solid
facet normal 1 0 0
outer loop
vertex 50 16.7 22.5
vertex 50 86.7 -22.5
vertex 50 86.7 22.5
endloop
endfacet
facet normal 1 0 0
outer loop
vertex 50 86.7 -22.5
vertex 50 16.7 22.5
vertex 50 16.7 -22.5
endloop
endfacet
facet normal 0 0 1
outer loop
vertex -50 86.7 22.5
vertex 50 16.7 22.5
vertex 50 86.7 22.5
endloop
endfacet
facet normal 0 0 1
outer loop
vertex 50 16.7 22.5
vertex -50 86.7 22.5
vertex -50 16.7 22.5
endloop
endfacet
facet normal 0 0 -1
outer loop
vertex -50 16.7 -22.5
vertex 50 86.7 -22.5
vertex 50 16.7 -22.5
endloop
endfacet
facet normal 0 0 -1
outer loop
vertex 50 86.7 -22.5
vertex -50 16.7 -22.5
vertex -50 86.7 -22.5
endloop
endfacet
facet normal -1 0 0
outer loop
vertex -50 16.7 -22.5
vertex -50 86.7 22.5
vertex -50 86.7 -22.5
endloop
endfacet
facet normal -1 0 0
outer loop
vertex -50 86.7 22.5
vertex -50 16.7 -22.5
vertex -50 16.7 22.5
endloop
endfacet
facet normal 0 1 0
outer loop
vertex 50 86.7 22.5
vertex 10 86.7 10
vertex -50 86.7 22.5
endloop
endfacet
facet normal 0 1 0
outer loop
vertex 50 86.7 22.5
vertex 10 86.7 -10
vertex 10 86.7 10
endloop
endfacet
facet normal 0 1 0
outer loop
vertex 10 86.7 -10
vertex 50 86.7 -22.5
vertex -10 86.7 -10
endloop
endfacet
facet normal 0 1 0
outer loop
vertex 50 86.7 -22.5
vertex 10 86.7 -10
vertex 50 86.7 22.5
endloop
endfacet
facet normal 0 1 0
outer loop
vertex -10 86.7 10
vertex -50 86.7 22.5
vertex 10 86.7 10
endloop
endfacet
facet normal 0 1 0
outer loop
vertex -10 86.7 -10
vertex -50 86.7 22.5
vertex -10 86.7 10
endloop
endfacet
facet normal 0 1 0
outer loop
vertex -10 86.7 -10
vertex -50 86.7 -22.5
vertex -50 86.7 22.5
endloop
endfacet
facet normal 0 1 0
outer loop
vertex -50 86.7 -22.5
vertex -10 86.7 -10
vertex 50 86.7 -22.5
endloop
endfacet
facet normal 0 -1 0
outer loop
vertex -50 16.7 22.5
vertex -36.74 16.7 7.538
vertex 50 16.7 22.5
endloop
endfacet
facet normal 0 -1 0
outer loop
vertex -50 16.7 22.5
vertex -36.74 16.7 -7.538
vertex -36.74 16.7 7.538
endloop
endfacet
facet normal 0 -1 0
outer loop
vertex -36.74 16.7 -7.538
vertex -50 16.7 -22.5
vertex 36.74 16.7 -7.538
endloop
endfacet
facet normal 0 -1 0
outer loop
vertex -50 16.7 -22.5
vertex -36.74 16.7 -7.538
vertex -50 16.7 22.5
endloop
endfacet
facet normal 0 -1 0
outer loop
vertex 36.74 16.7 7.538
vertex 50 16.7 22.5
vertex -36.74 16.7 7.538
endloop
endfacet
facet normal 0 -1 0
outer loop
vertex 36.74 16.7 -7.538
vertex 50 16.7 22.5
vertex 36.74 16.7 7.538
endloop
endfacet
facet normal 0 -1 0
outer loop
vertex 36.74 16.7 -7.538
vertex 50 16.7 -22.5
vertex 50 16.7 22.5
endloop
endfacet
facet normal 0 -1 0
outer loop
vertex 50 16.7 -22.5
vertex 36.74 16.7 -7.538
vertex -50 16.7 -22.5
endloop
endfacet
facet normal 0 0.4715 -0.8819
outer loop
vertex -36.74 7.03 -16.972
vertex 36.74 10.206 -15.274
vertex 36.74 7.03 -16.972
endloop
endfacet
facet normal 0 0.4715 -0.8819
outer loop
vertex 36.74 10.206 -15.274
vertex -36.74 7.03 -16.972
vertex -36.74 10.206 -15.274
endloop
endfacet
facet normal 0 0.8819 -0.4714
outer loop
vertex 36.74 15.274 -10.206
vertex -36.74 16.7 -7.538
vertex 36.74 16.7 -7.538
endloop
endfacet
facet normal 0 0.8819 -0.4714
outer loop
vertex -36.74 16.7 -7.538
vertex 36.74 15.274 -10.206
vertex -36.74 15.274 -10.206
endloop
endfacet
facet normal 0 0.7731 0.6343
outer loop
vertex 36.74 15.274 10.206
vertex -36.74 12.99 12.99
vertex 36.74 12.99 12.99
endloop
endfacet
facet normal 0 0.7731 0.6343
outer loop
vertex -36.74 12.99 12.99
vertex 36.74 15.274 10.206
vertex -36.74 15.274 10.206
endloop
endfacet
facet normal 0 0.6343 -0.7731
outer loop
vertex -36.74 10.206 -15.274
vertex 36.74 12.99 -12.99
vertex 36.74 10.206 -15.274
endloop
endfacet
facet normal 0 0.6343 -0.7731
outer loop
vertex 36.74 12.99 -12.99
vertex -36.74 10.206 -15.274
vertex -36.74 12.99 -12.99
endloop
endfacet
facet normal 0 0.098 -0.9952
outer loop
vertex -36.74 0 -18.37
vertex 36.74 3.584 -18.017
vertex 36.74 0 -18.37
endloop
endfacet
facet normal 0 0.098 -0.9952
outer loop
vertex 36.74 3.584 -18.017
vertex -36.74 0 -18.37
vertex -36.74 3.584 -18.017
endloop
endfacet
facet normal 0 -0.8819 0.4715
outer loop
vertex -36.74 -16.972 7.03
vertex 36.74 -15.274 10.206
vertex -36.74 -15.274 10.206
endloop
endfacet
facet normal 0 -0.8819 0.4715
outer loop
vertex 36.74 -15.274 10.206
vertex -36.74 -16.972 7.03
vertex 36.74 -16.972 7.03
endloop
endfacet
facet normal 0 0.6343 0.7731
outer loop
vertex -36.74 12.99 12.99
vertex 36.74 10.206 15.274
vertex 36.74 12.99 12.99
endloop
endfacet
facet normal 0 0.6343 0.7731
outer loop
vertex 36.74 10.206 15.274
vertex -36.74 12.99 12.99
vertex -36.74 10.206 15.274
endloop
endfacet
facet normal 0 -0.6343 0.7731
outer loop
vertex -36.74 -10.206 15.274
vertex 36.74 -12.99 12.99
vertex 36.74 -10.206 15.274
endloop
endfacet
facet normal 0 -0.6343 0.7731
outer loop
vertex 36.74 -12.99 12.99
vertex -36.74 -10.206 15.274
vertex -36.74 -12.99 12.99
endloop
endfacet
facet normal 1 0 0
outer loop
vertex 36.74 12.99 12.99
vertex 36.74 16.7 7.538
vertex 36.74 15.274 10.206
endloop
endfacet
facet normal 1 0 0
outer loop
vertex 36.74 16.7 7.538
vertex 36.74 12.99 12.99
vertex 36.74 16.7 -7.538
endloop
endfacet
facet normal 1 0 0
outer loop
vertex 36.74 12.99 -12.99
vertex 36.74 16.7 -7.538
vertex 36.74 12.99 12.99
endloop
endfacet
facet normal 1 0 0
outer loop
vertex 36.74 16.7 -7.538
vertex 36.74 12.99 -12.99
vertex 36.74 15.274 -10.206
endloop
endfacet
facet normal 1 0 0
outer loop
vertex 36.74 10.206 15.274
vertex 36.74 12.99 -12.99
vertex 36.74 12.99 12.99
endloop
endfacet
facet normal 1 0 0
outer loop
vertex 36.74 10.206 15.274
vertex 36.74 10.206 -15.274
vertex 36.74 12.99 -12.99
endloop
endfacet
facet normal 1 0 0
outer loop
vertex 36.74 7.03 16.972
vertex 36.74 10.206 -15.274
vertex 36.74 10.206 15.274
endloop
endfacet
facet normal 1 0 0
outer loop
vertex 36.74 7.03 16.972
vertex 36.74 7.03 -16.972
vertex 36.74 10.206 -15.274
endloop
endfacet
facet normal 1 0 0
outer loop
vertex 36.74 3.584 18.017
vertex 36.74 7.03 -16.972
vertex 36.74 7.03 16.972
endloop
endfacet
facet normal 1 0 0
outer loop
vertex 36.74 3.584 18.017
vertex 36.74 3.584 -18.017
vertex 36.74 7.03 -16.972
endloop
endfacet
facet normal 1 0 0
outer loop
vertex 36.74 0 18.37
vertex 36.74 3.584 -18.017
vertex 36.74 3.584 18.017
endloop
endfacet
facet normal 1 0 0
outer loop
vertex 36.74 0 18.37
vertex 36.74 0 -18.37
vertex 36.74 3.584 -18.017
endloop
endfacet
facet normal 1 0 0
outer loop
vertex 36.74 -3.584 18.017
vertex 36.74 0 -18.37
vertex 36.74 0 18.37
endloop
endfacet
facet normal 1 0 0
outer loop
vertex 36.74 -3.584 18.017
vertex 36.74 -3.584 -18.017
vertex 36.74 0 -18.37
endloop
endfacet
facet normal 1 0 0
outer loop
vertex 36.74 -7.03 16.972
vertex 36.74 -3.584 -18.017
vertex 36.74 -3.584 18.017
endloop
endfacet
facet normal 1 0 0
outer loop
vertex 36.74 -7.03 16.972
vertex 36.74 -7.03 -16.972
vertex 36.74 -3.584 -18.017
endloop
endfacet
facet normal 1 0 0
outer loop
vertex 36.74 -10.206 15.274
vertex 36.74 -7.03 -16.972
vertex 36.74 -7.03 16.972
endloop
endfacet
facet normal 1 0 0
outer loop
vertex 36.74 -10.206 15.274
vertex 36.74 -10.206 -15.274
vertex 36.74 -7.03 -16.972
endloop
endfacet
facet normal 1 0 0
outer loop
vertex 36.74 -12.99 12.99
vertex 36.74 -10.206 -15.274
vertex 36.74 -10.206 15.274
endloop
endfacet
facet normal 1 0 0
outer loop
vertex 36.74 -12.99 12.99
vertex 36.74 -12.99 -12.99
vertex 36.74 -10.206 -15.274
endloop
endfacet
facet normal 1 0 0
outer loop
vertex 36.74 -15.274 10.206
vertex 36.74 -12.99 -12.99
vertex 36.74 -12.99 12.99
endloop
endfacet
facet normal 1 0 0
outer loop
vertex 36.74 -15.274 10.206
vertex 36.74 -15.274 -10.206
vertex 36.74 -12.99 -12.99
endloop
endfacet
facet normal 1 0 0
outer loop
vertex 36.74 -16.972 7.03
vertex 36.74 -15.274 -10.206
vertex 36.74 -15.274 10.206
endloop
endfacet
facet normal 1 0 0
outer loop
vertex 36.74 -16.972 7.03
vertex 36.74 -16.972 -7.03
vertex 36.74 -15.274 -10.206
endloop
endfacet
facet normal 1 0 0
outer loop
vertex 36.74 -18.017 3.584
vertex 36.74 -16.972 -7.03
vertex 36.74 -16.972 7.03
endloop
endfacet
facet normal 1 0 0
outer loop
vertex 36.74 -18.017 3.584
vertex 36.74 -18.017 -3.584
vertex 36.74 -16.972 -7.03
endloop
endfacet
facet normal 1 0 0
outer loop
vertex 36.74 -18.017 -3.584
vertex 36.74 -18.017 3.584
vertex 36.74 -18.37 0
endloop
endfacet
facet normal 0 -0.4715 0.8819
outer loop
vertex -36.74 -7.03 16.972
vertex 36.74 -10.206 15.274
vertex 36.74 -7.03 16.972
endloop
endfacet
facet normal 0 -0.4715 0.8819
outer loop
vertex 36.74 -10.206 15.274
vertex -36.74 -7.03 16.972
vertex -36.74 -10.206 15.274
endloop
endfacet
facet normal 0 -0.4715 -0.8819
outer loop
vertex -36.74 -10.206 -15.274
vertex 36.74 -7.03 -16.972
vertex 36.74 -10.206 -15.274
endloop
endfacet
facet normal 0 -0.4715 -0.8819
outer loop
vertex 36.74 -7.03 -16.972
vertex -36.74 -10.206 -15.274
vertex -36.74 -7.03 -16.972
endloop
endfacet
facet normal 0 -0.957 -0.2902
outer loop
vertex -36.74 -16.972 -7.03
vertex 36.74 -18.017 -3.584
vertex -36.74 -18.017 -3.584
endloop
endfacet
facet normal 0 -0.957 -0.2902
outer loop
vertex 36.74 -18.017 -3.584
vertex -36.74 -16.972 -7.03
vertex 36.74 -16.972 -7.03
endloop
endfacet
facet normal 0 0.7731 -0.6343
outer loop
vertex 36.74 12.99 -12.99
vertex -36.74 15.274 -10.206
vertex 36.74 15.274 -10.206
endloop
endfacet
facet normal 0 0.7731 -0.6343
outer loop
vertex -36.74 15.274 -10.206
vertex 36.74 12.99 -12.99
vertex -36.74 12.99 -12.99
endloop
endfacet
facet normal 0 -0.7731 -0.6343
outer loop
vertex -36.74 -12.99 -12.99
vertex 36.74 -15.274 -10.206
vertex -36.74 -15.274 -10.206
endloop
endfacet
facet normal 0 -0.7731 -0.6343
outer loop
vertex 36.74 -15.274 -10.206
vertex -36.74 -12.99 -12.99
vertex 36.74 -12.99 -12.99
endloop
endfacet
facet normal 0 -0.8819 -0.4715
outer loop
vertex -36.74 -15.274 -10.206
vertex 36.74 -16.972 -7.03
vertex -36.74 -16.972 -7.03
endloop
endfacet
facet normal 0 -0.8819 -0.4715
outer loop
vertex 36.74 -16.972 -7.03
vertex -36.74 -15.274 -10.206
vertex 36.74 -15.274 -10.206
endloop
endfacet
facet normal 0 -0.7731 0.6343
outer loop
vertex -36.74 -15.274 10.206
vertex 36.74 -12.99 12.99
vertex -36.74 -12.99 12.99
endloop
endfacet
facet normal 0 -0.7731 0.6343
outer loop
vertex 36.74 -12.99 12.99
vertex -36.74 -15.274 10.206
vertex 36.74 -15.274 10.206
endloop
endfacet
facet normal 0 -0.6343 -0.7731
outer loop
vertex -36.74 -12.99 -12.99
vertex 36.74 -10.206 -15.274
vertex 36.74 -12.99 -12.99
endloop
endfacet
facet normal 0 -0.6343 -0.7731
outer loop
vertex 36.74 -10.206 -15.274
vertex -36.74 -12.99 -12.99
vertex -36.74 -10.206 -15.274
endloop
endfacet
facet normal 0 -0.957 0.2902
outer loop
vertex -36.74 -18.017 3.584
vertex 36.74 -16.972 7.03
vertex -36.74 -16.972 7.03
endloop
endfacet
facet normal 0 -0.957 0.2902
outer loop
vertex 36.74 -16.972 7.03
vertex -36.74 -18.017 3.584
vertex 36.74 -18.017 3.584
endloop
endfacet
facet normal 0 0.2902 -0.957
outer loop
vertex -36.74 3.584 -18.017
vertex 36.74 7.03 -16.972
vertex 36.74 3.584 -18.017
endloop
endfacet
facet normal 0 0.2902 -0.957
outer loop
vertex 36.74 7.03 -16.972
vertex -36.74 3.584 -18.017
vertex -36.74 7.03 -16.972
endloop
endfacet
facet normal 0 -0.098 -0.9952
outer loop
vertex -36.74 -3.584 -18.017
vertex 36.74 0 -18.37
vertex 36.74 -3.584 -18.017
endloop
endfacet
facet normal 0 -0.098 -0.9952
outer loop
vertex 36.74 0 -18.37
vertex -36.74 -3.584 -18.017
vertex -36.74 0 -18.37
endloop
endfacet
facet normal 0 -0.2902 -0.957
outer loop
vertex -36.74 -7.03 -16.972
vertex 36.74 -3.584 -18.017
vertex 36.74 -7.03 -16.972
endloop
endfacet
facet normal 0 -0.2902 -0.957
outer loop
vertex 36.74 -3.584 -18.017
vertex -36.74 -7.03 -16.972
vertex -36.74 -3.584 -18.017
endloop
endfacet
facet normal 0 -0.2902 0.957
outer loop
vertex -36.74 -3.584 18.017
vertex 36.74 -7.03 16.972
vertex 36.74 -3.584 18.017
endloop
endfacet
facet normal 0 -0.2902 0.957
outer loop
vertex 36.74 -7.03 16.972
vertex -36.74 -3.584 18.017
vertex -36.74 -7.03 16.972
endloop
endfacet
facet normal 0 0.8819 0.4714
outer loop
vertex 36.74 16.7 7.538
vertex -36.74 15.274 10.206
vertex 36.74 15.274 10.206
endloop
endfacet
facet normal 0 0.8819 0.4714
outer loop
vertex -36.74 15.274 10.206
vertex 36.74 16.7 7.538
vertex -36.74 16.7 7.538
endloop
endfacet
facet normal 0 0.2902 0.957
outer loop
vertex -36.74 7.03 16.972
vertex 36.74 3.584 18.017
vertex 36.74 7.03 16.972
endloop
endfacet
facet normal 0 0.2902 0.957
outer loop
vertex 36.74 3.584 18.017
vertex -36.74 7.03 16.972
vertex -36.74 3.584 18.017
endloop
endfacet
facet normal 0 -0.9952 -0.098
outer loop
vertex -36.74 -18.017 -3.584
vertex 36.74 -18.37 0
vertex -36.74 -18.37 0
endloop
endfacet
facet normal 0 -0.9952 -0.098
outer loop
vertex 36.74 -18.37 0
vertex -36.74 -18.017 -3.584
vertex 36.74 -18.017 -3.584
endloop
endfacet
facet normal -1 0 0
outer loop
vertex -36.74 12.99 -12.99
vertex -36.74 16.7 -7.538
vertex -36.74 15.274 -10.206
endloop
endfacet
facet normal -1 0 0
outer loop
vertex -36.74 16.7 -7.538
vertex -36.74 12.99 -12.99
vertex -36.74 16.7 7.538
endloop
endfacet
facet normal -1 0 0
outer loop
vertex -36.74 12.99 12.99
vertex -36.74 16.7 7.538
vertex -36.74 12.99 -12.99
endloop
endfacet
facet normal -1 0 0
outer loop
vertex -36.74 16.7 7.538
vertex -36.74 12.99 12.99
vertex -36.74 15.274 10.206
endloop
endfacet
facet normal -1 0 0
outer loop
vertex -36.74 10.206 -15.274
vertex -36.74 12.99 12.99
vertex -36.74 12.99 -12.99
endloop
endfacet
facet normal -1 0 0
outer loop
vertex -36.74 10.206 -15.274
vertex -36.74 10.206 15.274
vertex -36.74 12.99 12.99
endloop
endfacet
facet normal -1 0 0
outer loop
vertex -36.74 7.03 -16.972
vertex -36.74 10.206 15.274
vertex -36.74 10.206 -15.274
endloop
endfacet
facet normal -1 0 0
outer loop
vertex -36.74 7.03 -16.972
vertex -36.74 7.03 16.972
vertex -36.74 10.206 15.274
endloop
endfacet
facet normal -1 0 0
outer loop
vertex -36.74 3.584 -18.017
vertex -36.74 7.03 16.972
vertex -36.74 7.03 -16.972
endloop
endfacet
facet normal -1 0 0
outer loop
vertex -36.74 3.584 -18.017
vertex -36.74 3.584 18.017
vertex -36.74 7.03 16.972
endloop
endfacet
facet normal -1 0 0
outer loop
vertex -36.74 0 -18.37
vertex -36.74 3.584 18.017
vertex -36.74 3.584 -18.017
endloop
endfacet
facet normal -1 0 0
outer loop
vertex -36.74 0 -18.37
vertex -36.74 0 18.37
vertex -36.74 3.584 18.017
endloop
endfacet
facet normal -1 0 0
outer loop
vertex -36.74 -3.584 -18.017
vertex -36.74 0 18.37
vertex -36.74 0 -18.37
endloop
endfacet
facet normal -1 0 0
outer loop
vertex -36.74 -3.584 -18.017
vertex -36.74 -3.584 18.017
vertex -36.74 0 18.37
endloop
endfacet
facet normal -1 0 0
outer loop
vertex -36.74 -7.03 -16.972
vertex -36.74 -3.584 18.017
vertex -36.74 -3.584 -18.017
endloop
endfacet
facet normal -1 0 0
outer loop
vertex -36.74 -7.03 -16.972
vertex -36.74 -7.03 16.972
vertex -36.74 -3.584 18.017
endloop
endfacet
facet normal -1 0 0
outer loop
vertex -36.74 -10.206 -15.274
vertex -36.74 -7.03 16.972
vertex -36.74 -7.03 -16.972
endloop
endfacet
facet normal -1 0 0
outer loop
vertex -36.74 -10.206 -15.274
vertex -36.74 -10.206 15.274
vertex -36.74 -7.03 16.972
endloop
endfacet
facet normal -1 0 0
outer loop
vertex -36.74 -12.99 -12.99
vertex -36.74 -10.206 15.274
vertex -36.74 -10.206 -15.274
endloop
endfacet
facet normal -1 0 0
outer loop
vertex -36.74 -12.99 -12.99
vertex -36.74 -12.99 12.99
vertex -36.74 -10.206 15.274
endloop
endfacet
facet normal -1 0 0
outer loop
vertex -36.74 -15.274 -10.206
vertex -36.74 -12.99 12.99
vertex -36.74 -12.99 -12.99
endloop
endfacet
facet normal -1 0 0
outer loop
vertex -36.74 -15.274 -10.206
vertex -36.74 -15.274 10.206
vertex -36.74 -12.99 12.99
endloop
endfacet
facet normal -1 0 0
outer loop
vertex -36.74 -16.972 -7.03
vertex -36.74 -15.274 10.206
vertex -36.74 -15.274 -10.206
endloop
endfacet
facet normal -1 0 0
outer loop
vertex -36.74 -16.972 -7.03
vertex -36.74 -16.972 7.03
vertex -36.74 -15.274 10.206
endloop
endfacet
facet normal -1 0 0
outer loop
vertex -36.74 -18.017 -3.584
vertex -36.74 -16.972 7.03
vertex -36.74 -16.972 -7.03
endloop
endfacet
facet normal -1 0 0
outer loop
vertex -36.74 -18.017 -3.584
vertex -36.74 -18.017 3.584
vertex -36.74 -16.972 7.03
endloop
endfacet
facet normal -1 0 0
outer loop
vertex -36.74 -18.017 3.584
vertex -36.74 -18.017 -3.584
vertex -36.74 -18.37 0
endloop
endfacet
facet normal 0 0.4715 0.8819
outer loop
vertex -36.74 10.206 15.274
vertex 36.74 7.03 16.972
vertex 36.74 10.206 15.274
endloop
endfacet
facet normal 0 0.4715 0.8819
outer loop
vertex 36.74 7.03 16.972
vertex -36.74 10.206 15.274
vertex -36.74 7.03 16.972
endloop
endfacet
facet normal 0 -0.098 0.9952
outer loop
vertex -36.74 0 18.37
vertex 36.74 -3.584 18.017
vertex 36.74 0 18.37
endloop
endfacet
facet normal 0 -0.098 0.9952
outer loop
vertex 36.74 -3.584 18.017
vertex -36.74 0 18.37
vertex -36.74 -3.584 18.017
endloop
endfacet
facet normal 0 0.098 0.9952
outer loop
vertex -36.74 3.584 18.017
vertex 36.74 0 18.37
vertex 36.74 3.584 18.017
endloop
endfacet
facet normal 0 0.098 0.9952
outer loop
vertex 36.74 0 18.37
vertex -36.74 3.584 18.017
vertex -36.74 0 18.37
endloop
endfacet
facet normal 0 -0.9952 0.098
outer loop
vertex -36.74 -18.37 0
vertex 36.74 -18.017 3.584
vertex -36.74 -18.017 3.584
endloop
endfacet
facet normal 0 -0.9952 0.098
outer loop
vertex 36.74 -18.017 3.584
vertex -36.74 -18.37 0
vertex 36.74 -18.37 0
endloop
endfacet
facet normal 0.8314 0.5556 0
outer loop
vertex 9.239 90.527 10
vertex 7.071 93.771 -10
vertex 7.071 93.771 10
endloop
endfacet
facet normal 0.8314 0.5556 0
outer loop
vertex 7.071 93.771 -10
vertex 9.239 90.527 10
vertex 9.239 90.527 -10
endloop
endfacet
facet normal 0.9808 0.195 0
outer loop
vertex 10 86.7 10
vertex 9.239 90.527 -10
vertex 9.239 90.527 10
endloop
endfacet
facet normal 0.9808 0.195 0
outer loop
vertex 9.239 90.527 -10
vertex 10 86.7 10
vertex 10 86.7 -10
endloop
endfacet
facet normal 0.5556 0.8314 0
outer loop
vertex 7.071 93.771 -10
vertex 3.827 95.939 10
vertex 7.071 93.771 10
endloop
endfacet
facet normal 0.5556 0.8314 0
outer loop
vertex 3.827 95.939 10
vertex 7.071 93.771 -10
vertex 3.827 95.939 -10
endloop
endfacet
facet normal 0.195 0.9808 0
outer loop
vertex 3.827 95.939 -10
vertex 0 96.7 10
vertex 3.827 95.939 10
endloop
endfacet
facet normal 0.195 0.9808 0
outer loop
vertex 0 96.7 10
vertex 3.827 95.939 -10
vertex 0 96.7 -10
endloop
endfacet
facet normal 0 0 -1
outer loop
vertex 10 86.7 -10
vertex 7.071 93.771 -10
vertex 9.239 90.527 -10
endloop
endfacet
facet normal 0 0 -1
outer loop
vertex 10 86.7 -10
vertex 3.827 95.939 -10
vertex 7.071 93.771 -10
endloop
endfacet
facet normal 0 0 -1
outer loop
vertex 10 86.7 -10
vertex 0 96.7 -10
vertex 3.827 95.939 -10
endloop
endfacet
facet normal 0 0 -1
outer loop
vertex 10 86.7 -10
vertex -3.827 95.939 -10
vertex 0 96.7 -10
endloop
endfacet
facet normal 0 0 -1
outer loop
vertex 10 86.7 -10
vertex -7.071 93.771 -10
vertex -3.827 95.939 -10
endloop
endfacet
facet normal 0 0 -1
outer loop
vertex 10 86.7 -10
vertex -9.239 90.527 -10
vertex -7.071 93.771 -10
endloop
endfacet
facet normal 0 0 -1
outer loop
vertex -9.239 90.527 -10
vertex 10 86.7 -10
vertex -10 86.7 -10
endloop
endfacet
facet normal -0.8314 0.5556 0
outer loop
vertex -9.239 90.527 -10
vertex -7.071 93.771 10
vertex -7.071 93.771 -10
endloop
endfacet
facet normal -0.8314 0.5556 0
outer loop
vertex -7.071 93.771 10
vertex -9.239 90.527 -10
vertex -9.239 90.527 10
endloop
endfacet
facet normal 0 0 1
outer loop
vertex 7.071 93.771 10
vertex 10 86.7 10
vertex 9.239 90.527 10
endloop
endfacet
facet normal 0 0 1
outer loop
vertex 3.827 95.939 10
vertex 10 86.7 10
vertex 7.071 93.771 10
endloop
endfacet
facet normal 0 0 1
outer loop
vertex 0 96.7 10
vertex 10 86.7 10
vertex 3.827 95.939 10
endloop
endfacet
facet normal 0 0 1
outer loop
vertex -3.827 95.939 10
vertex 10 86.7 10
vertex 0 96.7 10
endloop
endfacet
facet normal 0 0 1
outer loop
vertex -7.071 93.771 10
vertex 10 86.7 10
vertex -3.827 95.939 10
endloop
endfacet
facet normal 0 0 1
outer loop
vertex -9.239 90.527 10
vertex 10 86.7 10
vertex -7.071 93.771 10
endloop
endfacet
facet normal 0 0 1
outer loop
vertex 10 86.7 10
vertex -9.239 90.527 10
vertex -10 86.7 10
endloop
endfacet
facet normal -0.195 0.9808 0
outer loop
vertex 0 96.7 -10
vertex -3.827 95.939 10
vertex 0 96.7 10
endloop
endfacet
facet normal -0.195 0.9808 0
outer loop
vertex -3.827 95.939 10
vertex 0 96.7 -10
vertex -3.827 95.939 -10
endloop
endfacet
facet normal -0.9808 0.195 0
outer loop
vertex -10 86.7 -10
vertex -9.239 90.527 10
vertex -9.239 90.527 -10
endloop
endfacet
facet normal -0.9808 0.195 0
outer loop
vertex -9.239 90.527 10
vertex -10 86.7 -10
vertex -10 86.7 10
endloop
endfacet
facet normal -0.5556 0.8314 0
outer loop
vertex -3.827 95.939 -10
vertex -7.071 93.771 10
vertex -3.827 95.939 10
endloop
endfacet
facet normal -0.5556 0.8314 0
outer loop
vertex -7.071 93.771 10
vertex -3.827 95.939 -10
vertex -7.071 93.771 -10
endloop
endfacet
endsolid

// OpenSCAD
// Auto-generated by scripts/author_from_manifest.py (Phase D.3).
// Source: data/phase_d_manifest.json (sku_intent='potter-psb-pressure-switch').
// Do not hand-edit — regenerate from the manifest.
//
// @part potter_psb_pressure_switch
// @kind device
// @category trim.pressure.switch
// @display-name "Potter PSB-1 Pressure Switch"
// @mfg potter_electric_signal
// @mfg-pn PSB-1
// @listing UL FM
// @price-usd 78.00
// @install-minutes 12
// @crew journeyman
// @param size_in number default=2 label="Size" unit="in"
// @port pipe position=[0,0,0] direction=[-1,0,0] style=grooved size_in=2 role=run_a

size_in = 1.0;

function od_mm(nps) =
    nps ==   1  ? 33.4 :
    nps == 1.25 ? 42.2 :
    nps == 1.5  ? 48.3 :
    nps ==   2  ? 60.3 : 33.4;

od = od_mm(size_in);
box_w = 100;
box_h = 70;
box_d = 45;

union() {
    // Enclosure
    translate([0, box_h/2 + od/2, 0])
        cube([box_w, box_h, box_d], center = true);
    // Pipe saddle stub
    rotate([0, 90, 0])
        cylinder(h = od * 2.2, d = od * 1.1, center = true, $fn = 32);
    // Conduit nipple
    translate([0, box_h + od/2, 0])
        cylinder(h = 20, d = 20, center = true, $fn = 16);
}
